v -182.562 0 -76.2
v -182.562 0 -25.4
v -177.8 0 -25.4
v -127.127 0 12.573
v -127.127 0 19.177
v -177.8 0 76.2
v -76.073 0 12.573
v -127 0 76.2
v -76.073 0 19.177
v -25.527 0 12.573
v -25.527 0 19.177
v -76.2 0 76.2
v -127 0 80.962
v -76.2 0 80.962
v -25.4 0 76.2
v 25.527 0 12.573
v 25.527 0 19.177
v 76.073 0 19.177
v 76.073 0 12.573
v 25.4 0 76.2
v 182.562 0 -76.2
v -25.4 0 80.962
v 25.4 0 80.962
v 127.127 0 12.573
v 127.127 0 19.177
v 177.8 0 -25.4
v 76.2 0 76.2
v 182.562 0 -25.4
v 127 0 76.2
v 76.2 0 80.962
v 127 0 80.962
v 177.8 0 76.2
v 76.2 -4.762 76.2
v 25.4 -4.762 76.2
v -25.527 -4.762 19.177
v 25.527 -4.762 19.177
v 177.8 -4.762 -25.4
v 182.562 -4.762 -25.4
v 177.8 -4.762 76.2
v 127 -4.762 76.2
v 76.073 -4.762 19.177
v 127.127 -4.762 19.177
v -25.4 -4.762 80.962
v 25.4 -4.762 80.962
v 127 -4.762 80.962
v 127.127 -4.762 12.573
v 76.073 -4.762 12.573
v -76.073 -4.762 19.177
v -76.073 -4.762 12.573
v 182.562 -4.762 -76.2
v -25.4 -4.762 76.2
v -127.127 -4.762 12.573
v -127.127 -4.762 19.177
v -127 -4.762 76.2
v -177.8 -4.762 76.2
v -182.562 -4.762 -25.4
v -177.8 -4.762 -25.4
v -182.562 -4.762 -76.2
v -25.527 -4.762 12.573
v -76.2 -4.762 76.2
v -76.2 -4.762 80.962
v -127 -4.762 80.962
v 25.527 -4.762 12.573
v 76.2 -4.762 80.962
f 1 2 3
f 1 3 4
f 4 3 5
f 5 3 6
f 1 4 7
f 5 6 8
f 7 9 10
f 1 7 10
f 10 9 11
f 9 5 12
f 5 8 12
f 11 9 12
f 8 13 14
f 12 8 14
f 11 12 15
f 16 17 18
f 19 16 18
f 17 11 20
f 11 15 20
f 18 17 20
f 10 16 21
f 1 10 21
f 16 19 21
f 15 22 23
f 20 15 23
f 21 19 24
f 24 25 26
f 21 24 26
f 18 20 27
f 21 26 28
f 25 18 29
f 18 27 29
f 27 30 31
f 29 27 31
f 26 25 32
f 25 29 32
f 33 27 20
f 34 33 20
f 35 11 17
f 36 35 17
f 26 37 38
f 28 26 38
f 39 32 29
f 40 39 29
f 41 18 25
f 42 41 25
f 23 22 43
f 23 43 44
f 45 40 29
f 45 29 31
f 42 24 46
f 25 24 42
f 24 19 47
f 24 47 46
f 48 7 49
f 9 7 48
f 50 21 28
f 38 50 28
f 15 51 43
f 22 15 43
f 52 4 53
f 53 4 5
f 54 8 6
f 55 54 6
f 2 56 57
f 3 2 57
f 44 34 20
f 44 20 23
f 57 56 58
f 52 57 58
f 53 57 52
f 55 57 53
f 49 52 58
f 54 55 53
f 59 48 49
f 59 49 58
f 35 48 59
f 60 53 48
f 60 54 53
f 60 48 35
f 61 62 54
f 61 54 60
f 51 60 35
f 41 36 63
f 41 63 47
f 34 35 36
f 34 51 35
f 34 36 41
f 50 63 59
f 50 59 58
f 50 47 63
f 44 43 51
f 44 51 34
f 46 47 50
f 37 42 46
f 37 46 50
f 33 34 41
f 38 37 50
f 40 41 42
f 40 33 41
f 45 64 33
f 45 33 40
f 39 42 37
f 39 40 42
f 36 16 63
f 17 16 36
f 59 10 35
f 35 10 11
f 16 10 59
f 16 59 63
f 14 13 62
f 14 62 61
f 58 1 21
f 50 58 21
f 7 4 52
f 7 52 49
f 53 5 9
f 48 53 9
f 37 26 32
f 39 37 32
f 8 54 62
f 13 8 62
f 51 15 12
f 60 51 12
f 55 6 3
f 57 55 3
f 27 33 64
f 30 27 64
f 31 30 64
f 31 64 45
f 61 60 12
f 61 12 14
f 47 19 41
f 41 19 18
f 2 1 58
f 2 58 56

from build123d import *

# Parameters (mm, degrees)
F0_W     = 51.054
F0_H     = 6.604
F0_W_2   = 4.7625
F0_H_2   = 50.8
F0_W_3   = 50.8
F0_H_3   = 4.7625
F1_DEPTH = 4.7625


with BuildPart() as f1:
    # F0 (on Front) → F1 (new body)
    with BuildSketch(Plane.XZ):
        Polygon((-127, 76.2), (-177.8, 76.2), (-177.8, -25.4), (-177.8, -76.2), (177.8, -76.2), (177.8, -25.4), (177.8, 76.2), (127, 76.2), (76.2, 76.2), (25.4, 76.2), (-25.4, 76.2), (-76.2, 76.2), align=None)
        with Locations((-101.6, 15.875)):
            Rectangle(F0_W, F0_H, mode=Mode.SUBTRACT)
        with Locations((0, 15.875)):
            Rectangle(F0_W, F0_H, mode=Mode.SUBTRACT)
        with Locations((101.6, 15.875)):
            Rectangle(F0_W, F0_H, mode=Mode.SUBTRACT)
        with Locations((180.18125, -50.8)):
            Rectangle(F0_W_2, F0_H_2)
        with Locations((-180.18125, -50.8)):
            Rectangle(F0_W_2, F0_H_2)
        with Locations((-101.6, 78.58125)):
            Rectangle(F0_W_3, F0_H_3)
        with Locations((0, 78.58125)):
            Rectangle(F0_W_3, F0_H_3)
        with Locations((101.6, 78.58125)):
            Rectangle(F0_W_3, F0_H_3)
    extrude(amount=F1_DEPTH)


solid = f1.part
